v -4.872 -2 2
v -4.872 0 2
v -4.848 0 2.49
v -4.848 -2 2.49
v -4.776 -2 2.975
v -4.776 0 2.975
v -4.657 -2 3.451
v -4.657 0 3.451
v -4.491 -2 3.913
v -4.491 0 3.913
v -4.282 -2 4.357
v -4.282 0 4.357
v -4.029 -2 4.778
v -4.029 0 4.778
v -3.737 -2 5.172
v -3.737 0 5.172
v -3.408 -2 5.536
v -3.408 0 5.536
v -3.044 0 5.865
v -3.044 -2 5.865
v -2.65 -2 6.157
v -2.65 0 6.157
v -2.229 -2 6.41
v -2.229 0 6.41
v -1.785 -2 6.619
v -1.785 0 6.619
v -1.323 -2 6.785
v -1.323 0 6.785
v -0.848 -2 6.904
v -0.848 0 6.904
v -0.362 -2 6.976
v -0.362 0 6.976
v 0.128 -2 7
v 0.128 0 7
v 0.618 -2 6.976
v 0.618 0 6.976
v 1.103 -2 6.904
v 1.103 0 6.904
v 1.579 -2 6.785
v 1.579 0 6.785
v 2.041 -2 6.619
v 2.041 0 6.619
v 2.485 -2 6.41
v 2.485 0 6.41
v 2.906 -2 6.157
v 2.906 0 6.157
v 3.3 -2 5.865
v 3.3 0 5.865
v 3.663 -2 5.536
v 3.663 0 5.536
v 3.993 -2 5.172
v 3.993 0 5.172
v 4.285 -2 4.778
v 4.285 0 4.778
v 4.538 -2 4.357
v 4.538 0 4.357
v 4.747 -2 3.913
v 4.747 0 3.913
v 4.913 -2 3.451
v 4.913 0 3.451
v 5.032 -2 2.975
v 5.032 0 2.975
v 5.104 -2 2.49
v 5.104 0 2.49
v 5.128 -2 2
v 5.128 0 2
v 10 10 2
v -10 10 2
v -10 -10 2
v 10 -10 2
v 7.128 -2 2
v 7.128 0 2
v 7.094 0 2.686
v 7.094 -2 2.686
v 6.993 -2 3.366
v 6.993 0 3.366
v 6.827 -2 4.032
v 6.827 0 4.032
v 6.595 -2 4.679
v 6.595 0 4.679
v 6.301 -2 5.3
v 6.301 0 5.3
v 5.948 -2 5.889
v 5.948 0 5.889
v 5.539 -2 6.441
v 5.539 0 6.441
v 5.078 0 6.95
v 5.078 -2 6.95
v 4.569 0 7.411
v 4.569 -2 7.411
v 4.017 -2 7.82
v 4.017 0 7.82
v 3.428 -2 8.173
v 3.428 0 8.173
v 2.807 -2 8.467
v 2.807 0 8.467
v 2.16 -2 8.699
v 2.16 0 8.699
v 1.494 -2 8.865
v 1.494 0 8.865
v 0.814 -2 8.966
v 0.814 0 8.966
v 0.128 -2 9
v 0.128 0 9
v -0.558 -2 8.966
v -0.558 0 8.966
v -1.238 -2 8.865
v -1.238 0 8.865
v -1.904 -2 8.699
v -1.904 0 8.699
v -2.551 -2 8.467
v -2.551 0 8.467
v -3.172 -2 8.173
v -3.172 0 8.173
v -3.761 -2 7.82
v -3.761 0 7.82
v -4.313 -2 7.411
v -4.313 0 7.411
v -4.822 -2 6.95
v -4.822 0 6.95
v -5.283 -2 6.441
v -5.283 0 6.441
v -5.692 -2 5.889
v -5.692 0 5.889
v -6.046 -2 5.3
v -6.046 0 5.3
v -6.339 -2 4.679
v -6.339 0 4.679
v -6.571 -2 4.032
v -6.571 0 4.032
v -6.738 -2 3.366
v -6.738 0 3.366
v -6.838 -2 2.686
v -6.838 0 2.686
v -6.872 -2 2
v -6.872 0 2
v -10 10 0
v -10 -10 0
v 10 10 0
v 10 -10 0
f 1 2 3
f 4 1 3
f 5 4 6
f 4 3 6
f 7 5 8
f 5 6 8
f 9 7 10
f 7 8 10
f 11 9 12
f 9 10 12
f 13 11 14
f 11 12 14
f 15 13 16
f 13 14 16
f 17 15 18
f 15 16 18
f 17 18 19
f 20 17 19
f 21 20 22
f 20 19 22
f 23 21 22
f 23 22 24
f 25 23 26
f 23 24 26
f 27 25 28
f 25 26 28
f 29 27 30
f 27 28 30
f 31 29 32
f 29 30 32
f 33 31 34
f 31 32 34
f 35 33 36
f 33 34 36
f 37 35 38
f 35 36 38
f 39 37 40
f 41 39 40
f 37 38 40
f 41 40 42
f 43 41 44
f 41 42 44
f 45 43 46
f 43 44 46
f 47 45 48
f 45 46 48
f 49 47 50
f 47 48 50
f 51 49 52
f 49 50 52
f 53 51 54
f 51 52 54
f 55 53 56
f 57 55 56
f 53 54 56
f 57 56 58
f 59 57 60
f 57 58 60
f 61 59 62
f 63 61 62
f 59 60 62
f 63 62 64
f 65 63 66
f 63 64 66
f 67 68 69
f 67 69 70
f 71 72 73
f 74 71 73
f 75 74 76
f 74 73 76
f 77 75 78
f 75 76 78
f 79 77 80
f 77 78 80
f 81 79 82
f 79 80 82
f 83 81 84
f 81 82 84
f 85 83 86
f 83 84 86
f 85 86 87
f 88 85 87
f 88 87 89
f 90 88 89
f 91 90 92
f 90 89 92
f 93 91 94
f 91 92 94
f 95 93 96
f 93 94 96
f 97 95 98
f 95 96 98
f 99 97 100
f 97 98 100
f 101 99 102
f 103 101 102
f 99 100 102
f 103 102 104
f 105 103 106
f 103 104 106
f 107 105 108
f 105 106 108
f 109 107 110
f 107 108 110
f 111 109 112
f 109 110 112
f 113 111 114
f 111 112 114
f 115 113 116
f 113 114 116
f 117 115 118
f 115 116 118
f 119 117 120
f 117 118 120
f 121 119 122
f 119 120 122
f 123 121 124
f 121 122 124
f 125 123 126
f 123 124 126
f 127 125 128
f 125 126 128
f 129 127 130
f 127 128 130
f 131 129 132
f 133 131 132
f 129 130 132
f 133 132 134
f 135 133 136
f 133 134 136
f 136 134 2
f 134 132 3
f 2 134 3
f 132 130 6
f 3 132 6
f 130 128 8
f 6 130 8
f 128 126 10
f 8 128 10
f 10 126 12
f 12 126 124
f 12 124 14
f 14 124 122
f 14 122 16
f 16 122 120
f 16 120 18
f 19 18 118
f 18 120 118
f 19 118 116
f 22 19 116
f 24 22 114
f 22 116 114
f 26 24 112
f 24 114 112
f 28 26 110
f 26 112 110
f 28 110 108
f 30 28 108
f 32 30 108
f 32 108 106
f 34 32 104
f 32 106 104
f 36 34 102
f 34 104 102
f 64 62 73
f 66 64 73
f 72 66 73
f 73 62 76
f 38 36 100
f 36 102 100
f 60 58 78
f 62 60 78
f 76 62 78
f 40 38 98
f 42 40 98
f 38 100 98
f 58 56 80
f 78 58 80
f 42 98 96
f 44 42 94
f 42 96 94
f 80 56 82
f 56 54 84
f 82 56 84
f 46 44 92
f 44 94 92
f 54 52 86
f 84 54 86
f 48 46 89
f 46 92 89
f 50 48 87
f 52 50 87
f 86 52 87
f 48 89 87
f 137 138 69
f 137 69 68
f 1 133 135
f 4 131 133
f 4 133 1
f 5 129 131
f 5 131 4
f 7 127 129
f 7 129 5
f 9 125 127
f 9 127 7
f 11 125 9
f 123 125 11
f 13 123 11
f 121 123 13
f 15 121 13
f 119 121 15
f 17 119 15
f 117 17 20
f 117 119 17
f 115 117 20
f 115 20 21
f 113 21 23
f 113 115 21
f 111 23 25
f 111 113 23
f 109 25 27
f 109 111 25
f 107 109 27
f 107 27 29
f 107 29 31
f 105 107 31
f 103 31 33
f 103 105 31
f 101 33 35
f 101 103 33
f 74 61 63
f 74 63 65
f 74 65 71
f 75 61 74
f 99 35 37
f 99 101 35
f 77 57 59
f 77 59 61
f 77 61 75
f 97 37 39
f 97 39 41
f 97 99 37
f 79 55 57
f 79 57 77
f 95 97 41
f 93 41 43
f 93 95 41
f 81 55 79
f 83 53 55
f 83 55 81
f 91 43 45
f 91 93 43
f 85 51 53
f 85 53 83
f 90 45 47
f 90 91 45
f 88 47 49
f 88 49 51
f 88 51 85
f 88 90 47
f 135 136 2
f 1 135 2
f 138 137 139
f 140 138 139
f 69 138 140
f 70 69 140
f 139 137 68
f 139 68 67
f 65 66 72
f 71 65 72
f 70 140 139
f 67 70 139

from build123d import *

# Parameters (mm, degrees)
F0_W     = 20
F0_H     = 20
F2_DEPTH = 2
F3_DEPTH = 2


with BuildPart() as f2:
    # F0 (on Top) → F2 (new body)
    with BuildSketch(Plane.XY):
        Rectangle(F0_W, F0_H)
    extrude(amount=F2_DEPTH)


with BuildPart() as f3:
    # F1 (on Front) → F3 (new body)
    with BuildSketch(Plane.XZ):
        with BuildLine():
            ThreePointArc((-4.872052, 2), (0.127948, 7), (5.127948, 2))
            Line((5.127948, 2), (7.127948, 2))
            ThreePointArc((7.127948, 2), (0.127948, 9), (-6.872052, 2))
            Line((-6.872052, 2), (-4.872052, 2))
        make_face()
    extrude(amount=F3_DEPTH)


solid = Compound([f2.part, f3.part])
